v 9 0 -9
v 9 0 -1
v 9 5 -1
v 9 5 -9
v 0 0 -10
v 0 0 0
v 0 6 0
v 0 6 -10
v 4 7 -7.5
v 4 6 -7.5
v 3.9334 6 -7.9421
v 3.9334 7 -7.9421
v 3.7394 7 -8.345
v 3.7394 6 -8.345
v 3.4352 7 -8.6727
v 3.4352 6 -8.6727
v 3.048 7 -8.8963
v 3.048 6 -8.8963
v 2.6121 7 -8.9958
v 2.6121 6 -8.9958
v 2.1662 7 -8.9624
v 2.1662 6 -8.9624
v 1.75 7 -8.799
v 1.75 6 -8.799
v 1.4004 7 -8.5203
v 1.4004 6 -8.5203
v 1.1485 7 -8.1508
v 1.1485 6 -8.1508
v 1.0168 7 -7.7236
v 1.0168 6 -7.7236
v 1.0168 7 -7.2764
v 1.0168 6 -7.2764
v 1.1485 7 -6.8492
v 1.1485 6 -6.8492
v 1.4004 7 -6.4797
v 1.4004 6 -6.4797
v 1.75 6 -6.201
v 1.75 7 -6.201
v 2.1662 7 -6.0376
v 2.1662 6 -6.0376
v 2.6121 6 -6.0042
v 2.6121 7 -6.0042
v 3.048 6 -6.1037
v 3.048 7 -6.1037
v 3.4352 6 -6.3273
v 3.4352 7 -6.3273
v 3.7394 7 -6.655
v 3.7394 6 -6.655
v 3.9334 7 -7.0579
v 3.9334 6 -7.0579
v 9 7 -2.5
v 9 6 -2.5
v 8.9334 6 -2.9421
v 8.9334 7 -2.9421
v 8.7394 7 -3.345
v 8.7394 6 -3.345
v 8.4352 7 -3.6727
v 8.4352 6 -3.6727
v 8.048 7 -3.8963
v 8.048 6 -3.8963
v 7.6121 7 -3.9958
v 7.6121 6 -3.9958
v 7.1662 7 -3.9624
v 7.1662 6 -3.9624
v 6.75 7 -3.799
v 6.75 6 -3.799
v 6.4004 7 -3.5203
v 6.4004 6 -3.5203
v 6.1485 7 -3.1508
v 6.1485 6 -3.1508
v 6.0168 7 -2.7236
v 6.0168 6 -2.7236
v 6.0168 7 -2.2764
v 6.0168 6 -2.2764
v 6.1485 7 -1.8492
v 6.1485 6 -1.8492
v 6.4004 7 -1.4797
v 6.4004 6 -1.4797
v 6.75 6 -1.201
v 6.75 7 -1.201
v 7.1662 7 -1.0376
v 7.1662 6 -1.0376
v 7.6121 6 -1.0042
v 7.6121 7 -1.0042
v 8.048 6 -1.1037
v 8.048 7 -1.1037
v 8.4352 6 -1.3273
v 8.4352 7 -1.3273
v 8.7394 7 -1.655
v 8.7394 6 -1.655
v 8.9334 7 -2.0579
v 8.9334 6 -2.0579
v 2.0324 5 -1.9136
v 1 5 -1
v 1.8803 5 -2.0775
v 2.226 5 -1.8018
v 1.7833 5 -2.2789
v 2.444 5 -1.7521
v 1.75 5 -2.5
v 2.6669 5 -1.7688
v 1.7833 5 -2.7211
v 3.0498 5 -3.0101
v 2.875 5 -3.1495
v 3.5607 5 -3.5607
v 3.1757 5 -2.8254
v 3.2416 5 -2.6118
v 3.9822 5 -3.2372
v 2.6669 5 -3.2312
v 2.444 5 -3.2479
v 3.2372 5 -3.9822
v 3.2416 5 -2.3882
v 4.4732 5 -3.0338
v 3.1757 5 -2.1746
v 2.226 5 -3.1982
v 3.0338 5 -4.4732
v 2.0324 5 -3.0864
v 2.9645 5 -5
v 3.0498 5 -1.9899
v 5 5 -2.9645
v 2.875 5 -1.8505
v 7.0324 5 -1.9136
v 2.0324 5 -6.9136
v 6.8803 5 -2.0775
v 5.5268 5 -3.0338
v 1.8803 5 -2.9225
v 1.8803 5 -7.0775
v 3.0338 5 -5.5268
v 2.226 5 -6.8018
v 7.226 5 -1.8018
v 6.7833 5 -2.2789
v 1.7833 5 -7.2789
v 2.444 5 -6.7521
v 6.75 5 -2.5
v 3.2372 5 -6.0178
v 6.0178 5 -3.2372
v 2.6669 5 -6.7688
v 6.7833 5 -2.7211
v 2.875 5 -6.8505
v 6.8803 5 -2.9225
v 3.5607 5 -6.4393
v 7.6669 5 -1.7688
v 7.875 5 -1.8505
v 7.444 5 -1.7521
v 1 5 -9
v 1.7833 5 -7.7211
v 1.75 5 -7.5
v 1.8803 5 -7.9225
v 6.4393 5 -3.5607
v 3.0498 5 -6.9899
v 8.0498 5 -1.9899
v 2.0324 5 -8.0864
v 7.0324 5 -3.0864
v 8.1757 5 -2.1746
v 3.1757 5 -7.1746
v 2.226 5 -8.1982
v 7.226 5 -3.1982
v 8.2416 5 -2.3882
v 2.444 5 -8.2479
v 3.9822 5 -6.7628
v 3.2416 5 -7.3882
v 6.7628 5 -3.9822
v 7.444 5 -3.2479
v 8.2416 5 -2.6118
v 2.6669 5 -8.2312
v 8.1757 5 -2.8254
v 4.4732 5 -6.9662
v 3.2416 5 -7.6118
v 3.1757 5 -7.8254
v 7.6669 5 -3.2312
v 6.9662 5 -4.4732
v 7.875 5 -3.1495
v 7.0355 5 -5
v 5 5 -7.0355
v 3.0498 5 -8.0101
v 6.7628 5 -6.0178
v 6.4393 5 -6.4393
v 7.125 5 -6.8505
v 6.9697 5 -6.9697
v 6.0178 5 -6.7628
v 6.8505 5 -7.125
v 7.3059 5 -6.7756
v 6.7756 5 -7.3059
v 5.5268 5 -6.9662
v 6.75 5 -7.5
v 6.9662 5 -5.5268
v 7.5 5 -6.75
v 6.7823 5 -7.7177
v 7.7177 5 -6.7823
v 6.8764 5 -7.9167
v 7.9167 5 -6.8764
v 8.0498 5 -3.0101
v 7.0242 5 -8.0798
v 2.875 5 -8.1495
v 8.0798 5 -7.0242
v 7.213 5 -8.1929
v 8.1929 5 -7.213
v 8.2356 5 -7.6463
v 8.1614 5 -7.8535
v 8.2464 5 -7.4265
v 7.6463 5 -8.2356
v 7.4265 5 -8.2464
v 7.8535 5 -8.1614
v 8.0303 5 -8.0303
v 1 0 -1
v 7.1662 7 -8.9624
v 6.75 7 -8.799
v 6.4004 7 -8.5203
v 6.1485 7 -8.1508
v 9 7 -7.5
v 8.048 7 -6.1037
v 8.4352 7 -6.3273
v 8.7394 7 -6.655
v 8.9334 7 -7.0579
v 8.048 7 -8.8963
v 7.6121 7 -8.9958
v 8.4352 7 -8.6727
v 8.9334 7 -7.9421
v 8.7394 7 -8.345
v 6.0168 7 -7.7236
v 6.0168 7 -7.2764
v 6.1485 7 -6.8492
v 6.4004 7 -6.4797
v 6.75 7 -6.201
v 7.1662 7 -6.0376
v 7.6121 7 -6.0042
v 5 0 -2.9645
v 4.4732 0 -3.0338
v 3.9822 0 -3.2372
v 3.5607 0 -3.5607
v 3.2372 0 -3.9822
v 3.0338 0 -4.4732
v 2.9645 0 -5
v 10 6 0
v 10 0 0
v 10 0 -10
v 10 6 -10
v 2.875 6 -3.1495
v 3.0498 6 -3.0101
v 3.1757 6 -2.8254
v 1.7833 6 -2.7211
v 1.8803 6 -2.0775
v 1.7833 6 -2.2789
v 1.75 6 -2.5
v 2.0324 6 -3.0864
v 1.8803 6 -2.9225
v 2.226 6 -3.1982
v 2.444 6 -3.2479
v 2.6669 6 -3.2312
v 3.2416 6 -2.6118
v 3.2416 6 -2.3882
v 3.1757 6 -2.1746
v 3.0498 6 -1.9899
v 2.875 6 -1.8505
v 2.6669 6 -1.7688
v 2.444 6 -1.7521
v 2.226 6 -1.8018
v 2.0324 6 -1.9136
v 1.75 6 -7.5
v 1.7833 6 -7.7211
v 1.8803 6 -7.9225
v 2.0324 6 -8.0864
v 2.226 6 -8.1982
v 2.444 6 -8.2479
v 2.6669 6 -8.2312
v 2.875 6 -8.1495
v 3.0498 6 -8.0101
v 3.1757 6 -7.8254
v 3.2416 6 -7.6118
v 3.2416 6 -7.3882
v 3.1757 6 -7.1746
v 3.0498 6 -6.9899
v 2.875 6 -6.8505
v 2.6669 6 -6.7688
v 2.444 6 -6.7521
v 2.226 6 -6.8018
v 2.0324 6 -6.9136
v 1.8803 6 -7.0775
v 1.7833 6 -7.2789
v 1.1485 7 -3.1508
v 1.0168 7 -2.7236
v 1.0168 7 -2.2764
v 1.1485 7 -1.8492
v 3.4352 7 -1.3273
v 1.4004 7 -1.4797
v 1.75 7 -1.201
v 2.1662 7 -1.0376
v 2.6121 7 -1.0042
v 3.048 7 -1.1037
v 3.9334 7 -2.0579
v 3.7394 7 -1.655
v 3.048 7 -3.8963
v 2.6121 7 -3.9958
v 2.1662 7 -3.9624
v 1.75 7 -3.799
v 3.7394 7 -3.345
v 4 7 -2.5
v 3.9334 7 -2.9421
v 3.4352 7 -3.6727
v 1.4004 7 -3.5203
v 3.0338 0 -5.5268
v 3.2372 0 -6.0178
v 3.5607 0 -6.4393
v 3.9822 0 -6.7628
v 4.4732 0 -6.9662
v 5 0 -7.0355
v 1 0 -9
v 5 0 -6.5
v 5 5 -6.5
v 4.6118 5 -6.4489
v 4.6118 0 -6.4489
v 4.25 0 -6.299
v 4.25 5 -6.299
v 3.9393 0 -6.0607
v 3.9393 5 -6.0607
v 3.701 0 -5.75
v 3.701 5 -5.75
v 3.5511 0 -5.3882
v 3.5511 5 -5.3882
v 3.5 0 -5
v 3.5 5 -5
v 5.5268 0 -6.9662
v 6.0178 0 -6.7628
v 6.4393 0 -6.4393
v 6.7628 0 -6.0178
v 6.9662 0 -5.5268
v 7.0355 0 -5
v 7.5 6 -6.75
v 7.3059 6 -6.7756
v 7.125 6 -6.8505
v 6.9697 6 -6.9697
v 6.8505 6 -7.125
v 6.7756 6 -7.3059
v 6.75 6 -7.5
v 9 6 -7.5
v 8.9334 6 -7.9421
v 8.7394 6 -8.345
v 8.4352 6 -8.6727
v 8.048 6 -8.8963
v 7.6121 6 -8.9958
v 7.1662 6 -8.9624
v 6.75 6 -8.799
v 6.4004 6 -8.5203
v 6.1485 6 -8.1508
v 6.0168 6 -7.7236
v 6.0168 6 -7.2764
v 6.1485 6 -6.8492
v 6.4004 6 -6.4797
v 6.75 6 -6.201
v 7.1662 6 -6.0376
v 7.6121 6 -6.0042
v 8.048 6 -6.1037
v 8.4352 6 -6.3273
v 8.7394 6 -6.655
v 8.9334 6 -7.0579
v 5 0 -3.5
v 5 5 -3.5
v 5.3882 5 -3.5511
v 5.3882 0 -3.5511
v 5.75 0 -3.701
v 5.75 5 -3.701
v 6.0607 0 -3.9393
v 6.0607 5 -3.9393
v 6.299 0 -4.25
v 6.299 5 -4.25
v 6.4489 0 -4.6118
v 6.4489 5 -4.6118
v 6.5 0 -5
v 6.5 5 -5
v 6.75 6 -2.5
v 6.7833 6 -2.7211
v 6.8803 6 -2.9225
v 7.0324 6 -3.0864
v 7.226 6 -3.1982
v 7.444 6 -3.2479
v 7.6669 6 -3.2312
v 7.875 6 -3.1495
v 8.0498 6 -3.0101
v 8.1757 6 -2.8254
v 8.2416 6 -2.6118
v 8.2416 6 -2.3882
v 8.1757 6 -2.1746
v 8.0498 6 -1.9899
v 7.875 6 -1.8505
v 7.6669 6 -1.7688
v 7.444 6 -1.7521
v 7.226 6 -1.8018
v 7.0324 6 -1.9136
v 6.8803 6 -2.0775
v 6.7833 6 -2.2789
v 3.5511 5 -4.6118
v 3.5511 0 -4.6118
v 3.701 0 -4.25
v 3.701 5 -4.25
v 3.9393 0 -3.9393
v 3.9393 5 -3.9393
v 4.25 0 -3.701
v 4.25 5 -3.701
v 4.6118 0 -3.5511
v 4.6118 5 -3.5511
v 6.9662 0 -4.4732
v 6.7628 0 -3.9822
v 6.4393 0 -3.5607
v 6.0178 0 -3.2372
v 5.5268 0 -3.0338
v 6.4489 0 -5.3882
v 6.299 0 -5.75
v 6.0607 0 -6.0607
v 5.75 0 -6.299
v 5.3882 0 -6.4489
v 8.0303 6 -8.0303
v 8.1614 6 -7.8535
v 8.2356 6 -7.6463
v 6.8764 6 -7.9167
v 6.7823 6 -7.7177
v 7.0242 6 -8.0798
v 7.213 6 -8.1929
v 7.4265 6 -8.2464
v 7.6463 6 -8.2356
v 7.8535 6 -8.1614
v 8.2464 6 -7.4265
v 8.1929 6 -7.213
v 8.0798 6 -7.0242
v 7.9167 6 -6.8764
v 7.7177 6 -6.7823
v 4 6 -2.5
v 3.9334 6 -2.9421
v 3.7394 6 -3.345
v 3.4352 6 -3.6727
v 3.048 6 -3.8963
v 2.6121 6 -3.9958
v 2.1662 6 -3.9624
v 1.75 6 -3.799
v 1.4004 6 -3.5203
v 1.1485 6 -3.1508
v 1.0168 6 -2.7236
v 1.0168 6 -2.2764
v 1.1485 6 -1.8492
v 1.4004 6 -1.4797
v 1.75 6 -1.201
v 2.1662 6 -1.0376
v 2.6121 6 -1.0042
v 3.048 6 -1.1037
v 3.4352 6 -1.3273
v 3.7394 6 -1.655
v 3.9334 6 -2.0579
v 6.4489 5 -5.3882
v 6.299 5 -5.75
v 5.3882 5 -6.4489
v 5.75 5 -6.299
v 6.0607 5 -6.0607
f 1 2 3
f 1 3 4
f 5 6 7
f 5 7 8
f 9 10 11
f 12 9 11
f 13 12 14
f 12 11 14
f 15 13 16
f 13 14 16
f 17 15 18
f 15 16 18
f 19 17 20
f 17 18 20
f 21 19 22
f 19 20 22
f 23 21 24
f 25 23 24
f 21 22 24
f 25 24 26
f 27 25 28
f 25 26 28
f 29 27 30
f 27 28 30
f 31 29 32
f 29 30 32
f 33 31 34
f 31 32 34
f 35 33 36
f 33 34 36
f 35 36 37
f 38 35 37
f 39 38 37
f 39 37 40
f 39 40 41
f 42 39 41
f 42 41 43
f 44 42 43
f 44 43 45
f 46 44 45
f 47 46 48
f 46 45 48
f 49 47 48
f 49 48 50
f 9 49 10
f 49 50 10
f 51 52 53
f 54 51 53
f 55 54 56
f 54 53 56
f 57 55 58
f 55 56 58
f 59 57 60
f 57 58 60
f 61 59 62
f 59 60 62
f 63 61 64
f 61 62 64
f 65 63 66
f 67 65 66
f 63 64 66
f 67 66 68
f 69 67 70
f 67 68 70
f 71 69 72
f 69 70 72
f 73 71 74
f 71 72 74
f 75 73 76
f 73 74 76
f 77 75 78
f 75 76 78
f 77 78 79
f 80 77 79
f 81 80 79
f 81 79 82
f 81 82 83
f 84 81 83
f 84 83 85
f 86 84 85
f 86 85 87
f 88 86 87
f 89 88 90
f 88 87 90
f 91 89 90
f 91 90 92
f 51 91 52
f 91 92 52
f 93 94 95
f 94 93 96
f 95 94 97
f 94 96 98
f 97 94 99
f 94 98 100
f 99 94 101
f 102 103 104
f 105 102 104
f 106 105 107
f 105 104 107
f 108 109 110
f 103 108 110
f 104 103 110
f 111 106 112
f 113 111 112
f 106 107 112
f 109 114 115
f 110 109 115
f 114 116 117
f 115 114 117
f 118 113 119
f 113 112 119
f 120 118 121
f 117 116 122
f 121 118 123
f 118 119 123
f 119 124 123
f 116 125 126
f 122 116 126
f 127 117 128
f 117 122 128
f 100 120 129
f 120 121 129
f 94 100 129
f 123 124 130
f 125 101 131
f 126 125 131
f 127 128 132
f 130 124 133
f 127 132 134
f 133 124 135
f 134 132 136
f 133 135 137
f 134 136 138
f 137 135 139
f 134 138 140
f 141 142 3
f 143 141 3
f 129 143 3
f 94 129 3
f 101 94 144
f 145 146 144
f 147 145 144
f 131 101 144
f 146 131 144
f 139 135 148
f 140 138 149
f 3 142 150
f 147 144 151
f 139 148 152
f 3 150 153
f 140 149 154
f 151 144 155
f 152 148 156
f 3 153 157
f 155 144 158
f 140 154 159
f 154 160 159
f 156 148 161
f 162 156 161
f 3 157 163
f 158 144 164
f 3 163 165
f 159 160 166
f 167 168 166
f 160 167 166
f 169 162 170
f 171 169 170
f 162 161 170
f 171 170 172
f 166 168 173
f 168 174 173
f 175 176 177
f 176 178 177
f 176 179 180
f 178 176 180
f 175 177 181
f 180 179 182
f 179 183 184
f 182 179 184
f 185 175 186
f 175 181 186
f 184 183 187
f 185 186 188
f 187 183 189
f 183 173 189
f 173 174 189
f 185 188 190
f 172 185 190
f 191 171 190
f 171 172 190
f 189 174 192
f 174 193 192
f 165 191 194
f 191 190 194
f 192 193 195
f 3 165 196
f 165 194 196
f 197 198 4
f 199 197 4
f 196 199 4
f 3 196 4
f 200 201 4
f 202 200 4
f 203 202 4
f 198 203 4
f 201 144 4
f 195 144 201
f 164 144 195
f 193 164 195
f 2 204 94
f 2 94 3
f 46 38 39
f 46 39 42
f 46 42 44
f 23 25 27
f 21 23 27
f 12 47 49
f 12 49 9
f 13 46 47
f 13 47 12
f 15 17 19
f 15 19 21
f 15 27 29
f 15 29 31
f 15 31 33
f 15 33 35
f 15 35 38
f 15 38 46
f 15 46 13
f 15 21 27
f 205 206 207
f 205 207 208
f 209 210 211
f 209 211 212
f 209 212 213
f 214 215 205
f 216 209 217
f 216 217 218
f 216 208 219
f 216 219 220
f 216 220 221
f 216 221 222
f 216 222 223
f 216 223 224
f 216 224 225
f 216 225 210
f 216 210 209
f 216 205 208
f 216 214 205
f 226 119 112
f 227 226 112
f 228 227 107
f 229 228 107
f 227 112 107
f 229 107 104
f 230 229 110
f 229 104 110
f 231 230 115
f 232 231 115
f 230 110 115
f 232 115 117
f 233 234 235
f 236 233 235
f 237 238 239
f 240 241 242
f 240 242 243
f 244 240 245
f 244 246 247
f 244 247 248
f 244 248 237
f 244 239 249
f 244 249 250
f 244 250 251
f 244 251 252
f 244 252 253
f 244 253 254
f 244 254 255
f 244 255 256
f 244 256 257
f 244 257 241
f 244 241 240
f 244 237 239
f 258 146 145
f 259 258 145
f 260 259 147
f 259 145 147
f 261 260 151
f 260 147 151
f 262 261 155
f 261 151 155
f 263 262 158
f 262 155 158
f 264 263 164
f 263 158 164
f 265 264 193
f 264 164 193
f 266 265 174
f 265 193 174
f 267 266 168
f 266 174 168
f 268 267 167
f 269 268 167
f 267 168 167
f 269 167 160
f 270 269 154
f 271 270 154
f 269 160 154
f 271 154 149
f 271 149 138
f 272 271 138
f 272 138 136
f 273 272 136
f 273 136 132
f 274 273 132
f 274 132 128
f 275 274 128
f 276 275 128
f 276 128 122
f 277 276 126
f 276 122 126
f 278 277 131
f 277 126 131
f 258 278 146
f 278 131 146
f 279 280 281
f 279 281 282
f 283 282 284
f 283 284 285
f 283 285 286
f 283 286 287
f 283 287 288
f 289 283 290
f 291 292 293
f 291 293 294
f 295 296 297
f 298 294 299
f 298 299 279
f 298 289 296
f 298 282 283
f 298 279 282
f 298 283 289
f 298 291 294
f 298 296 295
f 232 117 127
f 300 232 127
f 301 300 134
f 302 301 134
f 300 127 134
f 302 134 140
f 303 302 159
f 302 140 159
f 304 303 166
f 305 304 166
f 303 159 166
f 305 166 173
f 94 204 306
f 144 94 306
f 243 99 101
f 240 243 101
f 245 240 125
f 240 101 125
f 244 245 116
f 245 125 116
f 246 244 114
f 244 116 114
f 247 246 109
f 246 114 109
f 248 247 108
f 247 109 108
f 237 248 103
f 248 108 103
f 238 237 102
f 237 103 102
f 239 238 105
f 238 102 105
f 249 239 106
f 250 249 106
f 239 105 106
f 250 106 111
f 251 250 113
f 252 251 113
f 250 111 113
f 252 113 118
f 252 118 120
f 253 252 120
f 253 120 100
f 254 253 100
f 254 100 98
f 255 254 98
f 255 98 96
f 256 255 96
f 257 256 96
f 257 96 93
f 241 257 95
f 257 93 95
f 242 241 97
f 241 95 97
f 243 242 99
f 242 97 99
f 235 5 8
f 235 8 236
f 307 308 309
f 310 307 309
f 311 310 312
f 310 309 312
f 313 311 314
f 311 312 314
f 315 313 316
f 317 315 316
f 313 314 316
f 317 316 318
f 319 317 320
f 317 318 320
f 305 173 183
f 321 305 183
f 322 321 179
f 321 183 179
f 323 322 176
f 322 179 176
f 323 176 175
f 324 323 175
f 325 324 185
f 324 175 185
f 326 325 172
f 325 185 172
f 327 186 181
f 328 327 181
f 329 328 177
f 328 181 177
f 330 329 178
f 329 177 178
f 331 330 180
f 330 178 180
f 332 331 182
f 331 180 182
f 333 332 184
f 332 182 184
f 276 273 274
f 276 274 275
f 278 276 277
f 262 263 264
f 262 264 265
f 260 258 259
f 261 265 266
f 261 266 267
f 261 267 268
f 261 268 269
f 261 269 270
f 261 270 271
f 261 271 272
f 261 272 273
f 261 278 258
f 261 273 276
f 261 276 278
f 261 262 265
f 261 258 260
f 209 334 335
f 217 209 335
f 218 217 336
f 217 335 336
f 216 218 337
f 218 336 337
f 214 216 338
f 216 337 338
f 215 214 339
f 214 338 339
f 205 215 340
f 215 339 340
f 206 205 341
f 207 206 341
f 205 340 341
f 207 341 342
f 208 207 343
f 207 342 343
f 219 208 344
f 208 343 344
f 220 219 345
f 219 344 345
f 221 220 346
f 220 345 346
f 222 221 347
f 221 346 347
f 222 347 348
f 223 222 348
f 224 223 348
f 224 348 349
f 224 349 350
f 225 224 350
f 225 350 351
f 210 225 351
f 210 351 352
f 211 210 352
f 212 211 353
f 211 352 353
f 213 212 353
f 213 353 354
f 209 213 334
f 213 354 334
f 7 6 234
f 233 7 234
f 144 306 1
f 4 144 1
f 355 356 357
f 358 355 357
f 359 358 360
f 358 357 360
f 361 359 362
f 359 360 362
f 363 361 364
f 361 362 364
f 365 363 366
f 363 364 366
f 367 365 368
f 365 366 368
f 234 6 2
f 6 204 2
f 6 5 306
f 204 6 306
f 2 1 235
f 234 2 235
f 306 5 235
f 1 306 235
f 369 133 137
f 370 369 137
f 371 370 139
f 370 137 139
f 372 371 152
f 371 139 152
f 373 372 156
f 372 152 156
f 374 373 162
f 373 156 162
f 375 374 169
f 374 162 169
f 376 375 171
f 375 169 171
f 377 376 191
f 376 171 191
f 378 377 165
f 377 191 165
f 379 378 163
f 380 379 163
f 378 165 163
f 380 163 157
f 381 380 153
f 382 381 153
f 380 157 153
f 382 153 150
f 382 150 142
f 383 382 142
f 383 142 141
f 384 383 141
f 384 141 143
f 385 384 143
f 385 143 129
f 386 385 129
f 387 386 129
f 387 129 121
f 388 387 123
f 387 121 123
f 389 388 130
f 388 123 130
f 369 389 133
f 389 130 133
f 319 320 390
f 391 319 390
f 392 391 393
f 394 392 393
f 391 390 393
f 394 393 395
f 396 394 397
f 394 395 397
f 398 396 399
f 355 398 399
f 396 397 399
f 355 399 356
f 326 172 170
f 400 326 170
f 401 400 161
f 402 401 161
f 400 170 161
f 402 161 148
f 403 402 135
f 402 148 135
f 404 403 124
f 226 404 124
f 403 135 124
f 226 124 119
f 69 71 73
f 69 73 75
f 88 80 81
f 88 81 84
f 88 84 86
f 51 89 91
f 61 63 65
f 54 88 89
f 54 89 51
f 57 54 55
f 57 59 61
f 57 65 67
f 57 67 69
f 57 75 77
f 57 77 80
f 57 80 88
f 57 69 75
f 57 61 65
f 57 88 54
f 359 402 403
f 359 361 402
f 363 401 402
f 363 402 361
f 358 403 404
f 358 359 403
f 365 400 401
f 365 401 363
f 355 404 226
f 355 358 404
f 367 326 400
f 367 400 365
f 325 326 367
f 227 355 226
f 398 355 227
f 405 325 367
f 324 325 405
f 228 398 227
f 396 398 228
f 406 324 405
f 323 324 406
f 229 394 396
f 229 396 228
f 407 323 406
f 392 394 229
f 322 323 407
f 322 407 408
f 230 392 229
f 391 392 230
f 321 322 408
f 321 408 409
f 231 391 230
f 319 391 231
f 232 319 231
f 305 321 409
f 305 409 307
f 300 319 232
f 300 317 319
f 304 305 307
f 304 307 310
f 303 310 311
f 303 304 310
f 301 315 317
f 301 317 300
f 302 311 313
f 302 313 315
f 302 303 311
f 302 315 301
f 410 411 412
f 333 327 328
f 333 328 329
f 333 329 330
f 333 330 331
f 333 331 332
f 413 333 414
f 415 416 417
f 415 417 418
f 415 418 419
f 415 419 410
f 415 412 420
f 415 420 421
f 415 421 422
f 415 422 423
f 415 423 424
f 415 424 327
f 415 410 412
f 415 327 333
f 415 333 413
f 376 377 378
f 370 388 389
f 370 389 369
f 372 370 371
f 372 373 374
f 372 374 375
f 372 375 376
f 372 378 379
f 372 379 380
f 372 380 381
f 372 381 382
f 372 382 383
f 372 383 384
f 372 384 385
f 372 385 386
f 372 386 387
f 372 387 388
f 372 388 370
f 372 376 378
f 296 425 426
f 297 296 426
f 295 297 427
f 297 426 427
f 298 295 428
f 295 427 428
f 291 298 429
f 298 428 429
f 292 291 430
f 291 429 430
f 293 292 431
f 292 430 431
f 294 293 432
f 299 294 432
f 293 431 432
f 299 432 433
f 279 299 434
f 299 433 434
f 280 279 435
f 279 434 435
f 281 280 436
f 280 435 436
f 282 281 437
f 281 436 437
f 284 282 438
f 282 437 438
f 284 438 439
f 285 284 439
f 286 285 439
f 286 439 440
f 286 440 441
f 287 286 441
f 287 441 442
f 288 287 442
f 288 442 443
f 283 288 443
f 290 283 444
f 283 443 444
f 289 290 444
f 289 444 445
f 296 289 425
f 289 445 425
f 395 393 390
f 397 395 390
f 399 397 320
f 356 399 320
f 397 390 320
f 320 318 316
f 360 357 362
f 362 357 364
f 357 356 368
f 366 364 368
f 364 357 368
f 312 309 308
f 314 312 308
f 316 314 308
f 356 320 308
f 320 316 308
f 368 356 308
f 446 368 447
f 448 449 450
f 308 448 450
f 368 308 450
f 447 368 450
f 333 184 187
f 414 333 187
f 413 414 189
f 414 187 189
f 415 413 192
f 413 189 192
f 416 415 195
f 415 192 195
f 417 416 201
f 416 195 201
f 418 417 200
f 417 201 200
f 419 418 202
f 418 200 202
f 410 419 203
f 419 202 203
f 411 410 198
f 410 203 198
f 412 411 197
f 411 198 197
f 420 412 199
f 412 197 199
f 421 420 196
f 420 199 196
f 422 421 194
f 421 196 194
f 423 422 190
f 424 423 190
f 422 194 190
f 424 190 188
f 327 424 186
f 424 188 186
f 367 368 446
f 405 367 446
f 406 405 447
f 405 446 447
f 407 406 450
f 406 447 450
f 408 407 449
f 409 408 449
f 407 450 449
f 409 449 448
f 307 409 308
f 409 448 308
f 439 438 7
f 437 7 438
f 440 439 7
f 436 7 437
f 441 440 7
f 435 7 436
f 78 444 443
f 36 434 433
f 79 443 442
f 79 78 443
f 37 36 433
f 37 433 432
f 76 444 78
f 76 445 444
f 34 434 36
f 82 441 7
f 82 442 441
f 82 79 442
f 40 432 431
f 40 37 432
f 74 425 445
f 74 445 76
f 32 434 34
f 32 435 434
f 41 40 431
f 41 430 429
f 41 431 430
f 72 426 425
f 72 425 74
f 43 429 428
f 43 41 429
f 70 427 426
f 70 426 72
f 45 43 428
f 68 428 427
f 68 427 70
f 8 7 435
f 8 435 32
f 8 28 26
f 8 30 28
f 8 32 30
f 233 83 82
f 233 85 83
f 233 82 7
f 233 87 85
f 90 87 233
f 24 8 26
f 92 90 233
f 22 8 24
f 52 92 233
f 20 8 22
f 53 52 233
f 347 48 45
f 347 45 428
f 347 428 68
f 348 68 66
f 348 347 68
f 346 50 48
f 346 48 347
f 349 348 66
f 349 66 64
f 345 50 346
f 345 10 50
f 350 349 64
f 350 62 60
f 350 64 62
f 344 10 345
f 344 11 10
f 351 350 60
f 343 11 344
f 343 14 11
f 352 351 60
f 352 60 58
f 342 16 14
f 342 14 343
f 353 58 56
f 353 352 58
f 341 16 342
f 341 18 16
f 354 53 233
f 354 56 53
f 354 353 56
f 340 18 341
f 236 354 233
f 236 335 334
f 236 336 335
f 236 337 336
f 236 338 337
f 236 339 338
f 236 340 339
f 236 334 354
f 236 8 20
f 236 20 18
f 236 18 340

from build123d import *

# Parameters (mm, degrees)
SKETCH1_W           = 10
SKETCH1_H           = 10
SKETCH1_W_2         = 8
SKETCH1_H_2         = 8
BOSS_EXTRUDE1_DEPTH = 6
BOSS_EXTRUDE2_REACH = 11
SKETCH2_W           = 8
SKETCH2_H           = 1
SKETCH3_R           = 1.5
BOSS_EXTRUDE3_DEPTH = 1
BOSS_EXTRUDE4_DEPTH = 5
SKETCH5_R           = 0.75
CUT_EXTRUDE2_DEPTH  = 1


with BuildPart() as part:
    # Sketch1 → Boss-Extrude1 (new body)
    with BuildSketch(Plane(origin=(0, 0, 0), x_dir=(1, 0, 0), z_dir=(0, 1, 0))):
        with Locations((5, 5)):
            Rectangle(SKETCH1_W, SKETCH1_H)
        with Locations((5, 5)):
            Rectangle(SKETCH1_W_2, SKETCH1_H_2, mode=Mode.SUBTRACT)
    extrude(amount=BOSS_EXTRUDE1_DEPTH)

    # Sketch2 → Boss-Extrude2 (add, up to next)
    with BuildSketch(Plane.XY.offset(-9), mode=Mode.PRIVATE) as boss_extrude2_sk1:
        with Locations((5, 5.5)):
            Rectangle(SKETCH2_W, SKETCH2_H)
    boss_extrude2_tool1 = extrude(boss_extrude2_sk1.sketch, amount=BOSS_EXTRUDE2_REACH, mode=Mode.PRIVATE) - part.part
    add(boss_extrude2_tool1.solids().sort_by_distance((5, 5.5, -9))[0])

    # Sketch3 → Boss-Extrude3 (add)
    with BuildSketch(Plane(origin=(0, 6, 0), x_dir=(1, 0, 0), z_dir=(0, 1, 0))):
        with Locations((2.5, 2.5)):
            Circle(SKETCH3_R)
        with Locations((7.5, 2.5)):
            Circle(SKETCH3_R)
        with Locations((7.5, 7.5)):
            Circle(SKETCH3_R)
        with Locations((2.5, 7.5)):
            Circle(SKETCH3_R)
    extrude(amount=BOSS_EXTRUDE3_DEPTH)

    # Sketch4 → Boss-Extrude4 (add)
    with BuildSketch(Plane(origin=(0, 5, 0), x_dir=(-1, 0, 0), z_dir=(0, -1, 0))):
        with BuildLine():
            Line((-3.5, 5), (-2.964466094, 5))
            ThreePointArc((-2.964466094, 5), (-3.560660172, 6.439339828), (-5, 7.035533906))
            Line((-5, 7.035533906), (-5, 6.5))
            ThreePointArc((-5, 6.5), (-3.939339828, 6.060660172), (-3.5, 5))
        make_face()
        with BuildLine():
            Line((-5, 6.5), (-5, 7.035533906))
            ThreePointArc((-5, 7.035533906), (-5.778965109, 6.88058811), (-6.43933984, 6.439339817))
            ThreePointArc((-6.43933984, 6.439339817), (-6.880588116, 5.778965094), (-7.035533906, 5))
            Line((-7.035533906, 5), (-6.5, 5))
            ThreePointArc((-6.5, 5), (-6.060660172, 6.060660172), (-5, 6.5))
        make_face()
        with BuildLine():
            ThreePointArc((-5, 2.964466094), (-3.560660172, 3.560660172), (-2.964466094, 5))
            Line((-2.964466094, 5), (-3.5, 5))
            ThreePointArc((-3.5, 5), (-3.939339828, 3.939339828), (-5, 3.5))
            Line((-5, 3.5), (-5, 2.964466094))
        make_face()
        with BuildLine():
            ThreePointArc((-7.035533906, 5), (-6.439339828, 3.560660172), (-5, 2.964466094))
            Line((-5, 2.964466094), (-5, 3.5))
            ThreePointArc((-5, 3.5), (-6.060660172, 3.939339828), (-6.5, 5))
            Line((-6.5, 5), (-7.035533906, 5))
        make_face()
    extrude(amount=BOSS_EXTRUDE4_DEPTH)

    # Sketch5 → Cut-Extrude2 (cut)
    with BuildSketch(Plane(origin=(0, 5, 0), x_dir=(-1, 0, 0), z_dir=(0, -1, 0))):
        with BuildLine():
            ThreePointArc((-7.5, 6.75), (-6.969669914, 6.969669914), (-6.75, 7.5))
            Line((-6.75, 7.5), (-7.5, 7.5))
            Line((-7.5, 7.5), (-7.5, 6.75))
        make_face()
        with BuildLine():
            Line((-7.5, 7.5), (-6.75, 7.5))
            ThreePointArc((-6.75, 7.5), (-8.030330086, 8.030330086), (-7.5, 6.75))
            Line((-7.5, 6.75), (-7.5, 7.5))
        make_face()
        with Locations((-2.5, 7.5)):
            Circle(SKETCH5_R)
        with Locations((-2.5, 2.5)):
            Circle(SKETCH5_R)
        with Locations((-7.5, 2.5)):
            Circle(SKETCH5_R)
    extrude(amount=-CUT_EXTRUDE2_DEPTH, mode=Mode.SUBTRACT)


solid = part.part
